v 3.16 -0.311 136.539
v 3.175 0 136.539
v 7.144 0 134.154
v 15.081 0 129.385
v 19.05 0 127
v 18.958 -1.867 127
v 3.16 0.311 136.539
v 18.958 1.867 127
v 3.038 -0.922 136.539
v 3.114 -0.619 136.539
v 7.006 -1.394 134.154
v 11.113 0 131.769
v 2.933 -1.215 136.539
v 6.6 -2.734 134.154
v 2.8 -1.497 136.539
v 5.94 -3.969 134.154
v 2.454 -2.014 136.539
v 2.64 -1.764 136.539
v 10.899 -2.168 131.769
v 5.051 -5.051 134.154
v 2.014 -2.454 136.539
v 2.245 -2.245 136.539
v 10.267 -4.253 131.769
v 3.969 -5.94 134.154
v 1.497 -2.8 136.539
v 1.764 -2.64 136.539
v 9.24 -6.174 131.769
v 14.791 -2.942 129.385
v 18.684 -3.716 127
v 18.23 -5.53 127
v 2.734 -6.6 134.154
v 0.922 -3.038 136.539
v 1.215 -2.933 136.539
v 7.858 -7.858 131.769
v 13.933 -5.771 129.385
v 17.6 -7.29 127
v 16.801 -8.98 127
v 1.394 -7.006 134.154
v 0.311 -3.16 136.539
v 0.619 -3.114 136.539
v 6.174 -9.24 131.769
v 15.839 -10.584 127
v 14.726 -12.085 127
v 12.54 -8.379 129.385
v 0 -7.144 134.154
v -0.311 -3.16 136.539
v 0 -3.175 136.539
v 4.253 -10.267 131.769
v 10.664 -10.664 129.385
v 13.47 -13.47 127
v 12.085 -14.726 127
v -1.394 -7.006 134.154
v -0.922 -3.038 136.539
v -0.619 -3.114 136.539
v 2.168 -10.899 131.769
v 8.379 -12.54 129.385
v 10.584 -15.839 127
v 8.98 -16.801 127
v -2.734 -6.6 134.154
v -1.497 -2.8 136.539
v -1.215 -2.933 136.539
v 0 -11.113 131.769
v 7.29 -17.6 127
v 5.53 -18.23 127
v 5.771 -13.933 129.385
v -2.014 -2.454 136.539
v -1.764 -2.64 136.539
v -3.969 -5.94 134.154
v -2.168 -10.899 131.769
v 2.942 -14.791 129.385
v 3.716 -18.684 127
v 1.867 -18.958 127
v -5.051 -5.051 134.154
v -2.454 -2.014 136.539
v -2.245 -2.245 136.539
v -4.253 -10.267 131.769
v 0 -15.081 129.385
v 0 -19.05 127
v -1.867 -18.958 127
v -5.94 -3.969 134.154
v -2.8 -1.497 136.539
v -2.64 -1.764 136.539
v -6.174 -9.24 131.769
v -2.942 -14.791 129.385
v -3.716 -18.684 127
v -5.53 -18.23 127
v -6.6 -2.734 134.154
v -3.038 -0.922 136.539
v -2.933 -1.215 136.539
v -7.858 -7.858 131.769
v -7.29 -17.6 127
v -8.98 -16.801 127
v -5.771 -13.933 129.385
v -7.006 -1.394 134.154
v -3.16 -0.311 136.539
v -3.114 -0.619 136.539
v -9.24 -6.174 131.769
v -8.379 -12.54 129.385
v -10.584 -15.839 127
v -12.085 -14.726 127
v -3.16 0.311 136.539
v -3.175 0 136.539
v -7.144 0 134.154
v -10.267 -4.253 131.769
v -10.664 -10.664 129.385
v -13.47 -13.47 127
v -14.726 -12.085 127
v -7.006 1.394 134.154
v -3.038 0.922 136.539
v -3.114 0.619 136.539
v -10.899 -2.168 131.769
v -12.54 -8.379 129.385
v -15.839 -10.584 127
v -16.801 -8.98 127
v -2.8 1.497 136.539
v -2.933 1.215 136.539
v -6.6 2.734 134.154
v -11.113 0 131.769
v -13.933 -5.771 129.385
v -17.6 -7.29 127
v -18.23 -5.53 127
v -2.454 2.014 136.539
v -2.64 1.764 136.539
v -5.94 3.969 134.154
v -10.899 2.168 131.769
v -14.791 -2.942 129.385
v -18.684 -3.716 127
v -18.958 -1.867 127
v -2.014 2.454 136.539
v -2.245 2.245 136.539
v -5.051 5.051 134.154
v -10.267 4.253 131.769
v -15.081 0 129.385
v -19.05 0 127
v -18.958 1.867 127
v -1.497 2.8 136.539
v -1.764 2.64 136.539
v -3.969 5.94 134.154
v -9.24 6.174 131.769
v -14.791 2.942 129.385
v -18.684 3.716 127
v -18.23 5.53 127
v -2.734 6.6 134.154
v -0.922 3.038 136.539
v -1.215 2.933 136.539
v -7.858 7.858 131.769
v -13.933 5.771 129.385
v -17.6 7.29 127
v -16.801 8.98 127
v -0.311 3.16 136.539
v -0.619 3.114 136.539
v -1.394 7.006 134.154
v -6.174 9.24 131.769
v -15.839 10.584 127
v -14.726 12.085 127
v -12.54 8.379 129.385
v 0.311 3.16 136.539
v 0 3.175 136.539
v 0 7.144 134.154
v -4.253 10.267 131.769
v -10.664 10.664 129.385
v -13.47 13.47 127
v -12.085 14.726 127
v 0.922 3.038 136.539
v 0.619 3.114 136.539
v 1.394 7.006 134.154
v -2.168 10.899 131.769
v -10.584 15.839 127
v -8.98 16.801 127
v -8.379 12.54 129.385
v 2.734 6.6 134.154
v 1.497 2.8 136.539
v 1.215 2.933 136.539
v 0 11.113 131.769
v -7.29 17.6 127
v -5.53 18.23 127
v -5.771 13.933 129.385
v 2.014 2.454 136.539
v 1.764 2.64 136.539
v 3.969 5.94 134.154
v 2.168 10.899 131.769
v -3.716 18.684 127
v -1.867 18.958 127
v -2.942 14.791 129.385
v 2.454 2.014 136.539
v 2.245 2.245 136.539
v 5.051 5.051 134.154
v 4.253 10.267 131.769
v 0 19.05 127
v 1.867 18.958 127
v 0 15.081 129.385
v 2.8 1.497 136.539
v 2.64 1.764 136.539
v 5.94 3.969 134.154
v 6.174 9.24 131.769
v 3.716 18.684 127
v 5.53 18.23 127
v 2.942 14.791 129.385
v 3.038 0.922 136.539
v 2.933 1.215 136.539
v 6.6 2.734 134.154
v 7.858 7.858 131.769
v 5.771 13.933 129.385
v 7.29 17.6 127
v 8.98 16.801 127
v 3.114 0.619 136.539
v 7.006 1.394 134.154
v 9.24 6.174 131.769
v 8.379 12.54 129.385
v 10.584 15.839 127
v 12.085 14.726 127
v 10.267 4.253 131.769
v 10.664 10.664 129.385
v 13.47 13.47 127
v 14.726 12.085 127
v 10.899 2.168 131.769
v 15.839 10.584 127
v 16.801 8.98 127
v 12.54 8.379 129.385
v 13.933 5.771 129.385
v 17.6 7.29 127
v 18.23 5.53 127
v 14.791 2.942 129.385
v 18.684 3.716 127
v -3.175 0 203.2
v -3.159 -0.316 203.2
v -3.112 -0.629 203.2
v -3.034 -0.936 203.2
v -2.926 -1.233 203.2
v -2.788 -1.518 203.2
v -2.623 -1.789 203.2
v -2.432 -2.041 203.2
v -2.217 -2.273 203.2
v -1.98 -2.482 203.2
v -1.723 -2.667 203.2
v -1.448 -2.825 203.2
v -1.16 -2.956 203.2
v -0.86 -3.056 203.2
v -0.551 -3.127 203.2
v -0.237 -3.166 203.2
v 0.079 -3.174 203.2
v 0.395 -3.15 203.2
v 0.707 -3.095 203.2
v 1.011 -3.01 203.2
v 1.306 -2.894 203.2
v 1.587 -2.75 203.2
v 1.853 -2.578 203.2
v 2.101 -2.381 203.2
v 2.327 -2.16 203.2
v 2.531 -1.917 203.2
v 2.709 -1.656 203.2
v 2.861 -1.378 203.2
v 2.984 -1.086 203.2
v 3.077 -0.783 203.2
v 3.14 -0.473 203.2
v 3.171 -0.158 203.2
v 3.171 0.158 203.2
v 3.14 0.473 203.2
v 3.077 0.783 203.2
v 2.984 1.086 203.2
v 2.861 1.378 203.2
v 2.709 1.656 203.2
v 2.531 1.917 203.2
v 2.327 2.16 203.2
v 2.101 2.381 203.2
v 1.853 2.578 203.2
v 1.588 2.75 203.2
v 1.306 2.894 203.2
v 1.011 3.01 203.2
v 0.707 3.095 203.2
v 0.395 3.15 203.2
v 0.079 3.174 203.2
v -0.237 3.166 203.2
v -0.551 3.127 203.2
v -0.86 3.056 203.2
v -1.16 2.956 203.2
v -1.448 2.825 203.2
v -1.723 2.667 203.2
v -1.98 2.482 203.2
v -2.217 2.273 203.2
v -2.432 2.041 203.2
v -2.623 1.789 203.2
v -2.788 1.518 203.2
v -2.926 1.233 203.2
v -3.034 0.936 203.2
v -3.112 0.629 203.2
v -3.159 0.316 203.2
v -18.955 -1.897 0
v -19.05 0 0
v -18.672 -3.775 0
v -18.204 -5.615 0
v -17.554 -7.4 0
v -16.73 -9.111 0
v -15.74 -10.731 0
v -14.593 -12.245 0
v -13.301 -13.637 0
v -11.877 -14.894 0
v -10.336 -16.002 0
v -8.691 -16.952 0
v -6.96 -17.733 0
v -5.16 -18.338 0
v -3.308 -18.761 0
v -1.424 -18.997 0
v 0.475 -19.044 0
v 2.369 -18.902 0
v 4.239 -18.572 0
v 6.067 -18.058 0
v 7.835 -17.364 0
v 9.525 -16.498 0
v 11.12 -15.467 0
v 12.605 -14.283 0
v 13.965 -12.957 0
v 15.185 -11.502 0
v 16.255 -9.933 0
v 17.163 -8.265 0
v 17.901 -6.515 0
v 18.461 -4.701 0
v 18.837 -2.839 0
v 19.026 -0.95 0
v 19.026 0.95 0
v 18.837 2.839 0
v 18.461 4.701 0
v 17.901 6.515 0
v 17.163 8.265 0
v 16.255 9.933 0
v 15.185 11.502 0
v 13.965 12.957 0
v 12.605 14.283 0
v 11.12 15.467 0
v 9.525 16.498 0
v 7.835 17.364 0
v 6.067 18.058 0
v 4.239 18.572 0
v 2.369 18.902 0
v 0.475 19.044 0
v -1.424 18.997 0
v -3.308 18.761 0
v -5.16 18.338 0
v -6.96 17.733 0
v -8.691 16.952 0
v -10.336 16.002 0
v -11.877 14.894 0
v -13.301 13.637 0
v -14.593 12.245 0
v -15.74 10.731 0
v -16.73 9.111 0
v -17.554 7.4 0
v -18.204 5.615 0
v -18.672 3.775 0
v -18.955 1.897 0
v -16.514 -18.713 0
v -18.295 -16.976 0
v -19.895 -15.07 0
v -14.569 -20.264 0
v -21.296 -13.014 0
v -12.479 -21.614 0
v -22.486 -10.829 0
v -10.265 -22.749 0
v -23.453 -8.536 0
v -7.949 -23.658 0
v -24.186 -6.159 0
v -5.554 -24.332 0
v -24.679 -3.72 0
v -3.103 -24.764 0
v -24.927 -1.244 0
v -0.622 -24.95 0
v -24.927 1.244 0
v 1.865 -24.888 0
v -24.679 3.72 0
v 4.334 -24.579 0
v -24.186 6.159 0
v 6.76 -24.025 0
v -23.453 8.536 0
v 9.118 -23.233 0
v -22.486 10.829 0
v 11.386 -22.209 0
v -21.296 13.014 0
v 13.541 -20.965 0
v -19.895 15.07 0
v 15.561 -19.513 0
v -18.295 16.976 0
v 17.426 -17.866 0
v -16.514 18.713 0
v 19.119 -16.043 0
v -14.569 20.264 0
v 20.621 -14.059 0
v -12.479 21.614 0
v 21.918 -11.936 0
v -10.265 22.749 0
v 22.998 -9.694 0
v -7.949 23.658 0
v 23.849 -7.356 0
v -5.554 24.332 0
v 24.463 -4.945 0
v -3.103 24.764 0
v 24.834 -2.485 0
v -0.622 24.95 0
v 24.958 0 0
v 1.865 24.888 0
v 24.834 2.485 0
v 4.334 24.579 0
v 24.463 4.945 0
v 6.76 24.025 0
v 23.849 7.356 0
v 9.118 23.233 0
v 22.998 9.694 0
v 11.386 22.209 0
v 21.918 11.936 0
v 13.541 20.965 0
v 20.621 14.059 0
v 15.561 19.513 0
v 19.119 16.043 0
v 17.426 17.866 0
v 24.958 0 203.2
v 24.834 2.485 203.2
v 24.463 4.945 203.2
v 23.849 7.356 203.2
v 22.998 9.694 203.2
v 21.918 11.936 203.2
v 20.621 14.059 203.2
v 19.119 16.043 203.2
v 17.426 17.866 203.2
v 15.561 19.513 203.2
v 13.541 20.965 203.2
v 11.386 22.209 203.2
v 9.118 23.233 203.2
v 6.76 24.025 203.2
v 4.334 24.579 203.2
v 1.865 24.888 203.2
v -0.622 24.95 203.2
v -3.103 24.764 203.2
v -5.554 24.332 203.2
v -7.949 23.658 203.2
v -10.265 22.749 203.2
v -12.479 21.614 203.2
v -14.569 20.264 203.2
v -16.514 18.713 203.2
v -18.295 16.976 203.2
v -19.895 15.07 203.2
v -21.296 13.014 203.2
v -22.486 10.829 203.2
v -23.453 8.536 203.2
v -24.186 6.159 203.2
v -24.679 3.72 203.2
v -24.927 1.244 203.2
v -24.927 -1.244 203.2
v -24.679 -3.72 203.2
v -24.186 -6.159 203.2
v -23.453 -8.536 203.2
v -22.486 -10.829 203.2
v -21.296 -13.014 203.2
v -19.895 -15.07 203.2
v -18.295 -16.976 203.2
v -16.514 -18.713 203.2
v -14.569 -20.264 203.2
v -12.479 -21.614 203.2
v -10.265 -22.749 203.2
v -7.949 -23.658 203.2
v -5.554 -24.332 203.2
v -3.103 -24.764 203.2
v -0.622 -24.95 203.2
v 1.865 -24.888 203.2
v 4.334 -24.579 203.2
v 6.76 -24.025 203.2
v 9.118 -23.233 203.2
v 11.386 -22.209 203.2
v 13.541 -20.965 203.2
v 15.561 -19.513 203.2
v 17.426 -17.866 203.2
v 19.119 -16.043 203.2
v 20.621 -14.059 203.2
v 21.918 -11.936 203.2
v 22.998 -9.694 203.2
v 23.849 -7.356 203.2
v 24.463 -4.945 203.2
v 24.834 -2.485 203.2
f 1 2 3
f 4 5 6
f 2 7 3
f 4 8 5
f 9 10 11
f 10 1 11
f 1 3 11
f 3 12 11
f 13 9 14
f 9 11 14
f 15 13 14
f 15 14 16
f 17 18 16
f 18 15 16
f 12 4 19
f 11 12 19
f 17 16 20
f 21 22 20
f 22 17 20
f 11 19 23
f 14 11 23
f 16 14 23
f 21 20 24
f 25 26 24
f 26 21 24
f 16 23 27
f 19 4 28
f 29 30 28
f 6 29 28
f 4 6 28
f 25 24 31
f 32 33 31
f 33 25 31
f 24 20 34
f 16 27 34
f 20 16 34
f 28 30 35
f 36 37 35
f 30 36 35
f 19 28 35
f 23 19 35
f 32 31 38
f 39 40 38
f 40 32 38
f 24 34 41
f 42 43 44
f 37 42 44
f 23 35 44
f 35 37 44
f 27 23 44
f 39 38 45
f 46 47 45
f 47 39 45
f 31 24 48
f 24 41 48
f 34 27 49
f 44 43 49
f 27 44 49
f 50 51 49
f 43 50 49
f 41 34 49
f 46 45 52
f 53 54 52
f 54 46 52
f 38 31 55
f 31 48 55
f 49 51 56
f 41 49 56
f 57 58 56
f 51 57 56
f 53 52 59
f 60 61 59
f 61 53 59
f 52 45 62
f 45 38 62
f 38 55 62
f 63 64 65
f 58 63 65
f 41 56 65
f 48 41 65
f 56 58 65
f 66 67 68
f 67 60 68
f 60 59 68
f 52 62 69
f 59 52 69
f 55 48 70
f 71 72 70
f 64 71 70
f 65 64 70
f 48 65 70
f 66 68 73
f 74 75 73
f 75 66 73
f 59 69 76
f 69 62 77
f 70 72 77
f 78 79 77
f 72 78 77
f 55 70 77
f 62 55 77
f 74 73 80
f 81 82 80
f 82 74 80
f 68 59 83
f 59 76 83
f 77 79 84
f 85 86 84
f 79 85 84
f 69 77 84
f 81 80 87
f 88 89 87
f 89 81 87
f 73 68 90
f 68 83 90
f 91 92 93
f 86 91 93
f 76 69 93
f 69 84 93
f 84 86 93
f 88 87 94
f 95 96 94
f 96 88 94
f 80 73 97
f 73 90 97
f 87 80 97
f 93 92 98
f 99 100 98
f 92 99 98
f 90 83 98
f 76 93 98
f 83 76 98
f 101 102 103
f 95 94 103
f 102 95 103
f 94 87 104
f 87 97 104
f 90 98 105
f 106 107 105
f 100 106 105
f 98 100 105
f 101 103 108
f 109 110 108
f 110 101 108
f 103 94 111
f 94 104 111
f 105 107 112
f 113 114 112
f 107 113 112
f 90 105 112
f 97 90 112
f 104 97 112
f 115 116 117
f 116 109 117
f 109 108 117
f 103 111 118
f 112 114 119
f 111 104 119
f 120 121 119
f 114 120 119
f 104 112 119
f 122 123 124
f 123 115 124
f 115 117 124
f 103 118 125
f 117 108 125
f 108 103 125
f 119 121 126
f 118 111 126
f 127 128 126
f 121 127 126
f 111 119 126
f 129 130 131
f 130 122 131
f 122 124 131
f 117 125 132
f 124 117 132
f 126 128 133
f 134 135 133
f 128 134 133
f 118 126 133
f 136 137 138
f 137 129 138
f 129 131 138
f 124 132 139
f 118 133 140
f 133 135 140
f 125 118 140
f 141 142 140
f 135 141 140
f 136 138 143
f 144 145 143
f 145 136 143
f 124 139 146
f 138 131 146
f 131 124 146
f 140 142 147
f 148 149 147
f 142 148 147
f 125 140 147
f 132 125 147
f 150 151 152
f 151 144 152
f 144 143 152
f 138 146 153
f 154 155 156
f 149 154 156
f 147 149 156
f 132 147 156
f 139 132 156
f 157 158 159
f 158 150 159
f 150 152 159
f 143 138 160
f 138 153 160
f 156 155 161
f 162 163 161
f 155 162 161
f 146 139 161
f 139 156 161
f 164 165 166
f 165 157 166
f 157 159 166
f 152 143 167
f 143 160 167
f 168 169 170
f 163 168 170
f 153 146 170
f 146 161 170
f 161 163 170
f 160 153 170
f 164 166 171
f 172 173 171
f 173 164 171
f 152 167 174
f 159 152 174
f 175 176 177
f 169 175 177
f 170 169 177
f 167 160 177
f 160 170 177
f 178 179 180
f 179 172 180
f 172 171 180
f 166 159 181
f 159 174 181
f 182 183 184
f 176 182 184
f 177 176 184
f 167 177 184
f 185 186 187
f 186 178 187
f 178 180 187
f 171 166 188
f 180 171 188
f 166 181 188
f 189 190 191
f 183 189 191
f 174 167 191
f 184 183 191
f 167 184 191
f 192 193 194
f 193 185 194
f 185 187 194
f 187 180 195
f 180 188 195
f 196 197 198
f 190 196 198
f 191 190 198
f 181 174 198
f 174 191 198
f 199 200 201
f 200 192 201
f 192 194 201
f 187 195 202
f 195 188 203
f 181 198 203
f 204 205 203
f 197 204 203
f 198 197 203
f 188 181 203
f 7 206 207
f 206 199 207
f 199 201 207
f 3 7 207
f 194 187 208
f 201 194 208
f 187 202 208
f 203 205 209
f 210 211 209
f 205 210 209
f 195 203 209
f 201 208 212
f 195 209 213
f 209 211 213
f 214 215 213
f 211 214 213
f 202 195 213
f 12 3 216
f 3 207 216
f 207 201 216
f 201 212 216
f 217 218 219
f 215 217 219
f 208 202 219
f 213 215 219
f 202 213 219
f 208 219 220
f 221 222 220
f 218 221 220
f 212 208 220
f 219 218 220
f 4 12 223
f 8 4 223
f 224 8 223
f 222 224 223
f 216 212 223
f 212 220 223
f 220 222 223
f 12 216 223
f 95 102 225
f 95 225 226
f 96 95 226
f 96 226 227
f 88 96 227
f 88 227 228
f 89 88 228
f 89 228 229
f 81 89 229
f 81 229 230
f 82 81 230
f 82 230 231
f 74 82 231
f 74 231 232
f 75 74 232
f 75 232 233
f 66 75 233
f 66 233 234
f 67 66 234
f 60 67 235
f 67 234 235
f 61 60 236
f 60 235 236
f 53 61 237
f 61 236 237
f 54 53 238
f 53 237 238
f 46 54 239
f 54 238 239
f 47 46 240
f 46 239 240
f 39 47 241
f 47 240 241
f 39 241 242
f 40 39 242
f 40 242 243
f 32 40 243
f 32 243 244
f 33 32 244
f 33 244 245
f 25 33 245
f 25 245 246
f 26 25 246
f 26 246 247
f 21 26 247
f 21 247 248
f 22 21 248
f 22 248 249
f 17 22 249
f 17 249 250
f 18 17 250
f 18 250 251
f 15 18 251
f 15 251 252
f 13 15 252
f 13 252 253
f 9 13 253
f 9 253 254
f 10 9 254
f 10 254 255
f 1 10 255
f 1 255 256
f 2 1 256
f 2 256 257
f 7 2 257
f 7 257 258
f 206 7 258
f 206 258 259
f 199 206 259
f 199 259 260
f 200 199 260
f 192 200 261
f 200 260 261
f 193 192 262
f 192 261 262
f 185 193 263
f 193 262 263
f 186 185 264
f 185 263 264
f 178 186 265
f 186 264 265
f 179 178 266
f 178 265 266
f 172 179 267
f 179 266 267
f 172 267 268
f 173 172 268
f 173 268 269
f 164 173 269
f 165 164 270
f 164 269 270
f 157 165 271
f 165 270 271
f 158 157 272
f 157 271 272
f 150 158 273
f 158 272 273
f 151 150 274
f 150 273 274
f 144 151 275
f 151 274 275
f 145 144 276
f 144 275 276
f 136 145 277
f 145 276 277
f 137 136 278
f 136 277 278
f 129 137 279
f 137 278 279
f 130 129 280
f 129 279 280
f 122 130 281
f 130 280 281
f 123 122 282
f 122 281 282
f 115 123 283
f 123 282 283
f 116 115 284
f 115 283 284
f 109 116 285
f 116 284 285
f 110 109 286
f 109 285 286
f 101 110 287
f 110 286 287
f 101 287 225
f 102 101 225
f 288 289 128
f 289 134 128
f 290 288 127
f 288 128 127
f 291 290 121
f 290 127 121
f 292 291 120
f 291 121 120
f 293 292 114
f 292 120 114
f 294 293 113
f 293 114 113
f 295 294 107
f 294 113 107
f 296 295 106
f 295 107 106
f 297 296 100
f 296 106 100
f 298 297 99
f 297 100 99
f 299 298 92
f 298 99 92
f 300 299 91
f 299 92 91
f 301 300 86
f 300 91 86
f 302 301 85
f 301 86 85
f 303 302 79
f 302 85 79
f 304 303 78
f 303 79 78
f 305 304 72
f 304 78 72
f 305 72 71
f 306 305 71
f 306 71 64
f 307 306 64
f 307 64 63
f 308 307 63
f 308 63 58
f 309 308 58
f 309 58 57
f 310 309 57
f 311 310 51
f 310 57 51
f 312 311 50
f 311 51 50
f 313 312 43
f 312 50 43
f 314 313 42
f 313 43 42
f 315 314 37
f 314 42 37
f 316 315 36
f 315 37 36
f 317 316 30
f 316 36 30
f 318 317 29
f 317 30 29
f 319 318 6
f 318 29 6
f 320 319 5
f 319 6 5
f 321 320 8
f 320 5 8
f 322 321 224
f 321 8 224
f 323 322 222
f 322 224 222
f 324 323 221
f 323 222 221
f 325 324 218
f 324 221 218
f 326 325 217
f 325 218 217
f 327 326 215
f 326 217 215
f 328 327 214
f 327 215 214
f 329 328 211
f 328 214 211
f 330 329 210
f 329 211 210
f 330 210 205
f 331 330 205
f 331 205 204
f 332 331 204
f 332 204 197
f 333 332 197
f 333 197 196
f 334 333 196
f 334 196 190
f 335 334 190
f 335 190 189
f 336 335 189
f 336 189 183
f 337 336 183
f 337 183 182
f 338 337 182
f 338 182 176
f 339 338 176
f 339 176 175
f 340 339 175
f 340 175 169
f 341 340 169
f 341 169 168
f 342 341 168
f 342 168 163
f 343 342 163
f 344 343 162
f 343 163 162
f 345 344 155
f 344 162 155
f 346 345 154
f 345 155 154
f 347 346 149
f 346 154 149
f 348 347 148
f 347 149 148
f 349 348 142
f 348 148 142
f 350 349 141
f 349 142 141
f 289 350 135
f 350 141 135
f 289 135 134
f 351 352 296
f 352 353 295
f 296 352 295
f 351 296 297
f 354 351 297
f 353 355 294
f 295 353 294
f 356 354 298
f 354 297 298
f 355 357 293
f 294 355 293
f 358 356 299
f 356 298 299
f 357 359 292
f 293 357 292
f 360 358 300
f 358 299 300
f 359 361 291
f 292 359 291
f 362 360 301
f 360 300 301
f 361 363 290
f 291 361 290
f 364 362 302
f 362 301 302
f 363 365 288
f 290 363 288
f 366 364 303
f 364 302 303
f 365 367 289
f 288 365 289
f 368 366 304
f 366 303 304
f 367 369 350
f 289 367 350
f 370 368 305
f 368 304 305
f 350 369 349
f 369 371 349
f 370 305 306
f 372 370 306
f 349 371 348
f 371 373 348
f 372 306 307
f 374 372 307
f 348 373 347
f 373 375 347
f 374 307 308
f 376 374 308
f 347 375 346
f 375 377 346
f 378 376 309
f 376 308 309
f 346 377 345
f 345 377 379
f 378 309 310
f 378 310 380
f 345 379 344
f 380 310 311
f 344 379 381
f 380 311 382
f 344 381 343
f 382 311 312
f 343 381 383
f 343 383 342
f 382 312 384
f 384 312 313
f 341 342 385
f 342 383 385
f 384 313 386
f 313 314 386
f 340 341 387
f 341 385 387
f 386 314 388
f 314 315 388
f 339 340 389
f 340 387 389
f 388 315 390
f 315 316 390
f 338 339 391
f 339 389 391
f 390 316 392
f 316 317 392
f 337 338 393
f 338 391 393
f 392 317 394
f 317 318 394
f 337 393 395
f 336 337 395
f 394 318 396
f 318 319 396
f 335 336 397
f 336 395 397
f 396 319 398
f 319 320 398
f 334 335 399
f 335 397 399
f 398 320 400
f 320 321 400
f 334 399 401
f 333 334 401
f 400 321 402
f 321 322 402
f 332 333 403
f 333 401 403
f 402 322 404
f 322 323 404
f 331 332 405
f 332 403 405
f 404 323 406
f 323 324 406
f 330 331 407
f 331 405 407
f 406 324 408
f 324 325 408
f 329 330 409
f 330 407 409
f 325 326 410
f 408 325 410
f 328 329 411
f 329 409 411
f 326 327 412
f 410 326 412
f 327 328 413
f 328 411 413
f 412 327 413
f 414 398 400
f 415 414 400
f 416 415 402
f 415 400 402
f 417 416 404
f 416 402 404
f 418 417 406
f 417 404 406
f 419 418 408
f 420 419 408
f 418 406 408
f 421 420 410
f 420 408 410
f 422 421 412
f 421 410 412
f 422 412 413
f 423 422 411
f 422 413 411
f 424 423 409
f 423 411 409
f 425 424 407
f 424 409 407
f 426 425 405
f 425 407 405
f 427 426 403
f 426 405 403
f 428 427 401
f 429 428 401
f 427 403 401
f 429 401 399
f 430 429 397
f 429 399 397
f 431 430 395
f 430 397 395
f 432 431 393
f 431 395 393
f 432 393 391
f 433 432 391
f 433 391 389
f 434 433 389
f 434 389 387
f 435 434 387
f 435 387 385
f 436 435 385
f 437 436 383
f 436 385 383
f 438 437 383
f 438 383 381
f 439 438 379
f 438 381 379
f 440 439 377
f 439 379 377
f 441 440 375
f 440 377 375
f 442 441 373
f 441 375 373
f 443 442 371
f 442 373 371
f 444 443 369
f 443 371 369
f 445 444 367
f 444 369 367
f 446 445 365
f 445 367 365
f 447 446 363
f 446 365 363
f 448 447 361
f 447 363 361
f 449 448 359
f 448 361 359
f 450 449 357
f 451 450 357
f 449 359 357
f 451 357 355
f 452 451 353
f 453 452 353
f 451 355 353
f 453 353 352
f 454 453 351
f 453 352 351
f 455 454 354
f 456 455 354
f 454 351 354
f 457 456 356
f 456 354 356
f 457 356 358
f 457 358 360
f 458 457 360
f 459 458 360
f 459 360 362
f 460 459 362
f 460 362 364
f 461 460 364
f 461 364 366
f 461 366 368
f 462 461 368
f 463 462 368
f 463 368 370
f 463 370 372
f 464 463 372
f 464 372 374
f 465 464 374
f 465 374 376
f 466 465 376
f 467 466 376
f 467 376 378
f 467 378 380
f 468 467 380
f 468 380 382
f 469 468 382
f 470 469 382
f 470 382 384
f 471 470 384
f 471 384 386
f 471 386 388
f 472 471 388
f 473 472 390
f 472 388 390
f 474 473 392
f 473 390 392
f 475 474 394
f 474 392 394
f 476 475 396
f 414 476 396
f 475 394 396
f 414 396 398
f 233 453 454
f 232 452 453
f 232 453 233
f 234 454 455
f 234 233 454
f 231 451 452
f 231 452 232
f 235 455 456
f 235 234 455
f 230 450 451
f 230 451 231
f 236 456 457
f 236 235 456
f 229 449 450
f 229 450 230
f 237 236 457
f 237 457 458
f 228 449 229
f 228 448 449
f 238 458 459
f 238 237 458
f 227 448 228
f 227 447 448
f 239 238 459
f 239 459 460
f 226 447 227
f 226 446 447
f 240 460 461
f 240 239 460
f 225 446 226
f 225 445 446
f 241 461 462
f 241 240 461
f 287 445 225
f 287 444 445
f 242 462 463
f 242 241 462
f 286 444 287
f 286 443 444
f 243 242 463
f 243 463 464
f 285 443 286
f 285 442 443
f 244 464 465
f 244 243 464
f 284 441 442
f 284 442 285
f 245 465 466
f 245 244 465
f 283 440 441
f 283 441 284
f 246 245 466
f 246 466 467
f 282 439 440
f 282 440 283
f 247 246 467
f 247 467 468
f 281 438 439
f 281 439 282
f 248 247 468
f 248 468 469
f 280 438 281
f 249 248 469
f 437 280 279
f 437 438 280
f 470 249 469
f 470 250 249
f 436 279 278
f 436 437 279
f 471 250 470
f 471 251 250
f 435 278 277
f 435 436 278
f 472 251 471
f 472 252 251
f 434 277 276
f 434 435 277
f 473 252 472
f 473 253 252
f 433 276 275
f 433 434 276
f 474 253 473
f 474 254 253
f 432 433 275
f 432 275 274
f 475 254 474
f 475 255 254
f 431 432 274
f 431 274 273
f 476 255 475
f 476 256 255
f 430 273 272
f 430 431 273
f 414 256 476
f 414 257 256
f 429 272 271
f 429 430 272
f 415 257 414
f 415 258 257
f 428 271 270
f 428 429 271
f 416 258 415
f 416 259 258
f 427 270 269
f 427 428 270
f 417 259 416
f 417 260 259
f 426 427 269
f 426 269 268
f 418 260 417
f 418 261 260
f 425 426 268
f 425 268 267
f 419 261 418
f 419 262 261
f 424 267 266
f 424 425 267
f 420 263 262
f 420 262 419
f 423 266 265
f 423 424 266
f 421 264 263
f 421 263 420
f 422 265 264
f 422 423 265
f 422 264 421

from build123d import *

# Parameters (mm, degrees)
F1_R     = 24.9577735622
F2_DEPTH = 203.2
F3_D     = 38.1
F3_DEPTH = 127
F3_TIP   = 11.4463947925
F5_D     = 6.35


with BuildPart() as f2:
    # F1 (on Top) → F2 (new body)
    with BuildSketch(Plane.XY):
        Circle(F1_R)
    extrude(amount=F2_DEPTH)

    # F3
    with Locations(Plane(origin=(0, 0, 0), x_dir=(1, 0, 0), z_dir=(0, 0, -1))):
        with Locations((0, 0)):
            Hole(F3_D / 2, depth=F3_DEPTH)
            with Locations((0, 0, -(F3_DEPTH + F3_TIP / 2))):  # 118° drill point
                Cone(0, F3_D / 2, F3_TIP, mode=Mode.SUBTRACT)

    # F5 (through all)
    with Locations(Plane(origin=(0, 0, 0), x_dir=(1, 0, 0), z_dir=(0, 0, -1))):
        with Locations((0, 0)):
            Hole(F5_D / 2)


solid = f2.part
